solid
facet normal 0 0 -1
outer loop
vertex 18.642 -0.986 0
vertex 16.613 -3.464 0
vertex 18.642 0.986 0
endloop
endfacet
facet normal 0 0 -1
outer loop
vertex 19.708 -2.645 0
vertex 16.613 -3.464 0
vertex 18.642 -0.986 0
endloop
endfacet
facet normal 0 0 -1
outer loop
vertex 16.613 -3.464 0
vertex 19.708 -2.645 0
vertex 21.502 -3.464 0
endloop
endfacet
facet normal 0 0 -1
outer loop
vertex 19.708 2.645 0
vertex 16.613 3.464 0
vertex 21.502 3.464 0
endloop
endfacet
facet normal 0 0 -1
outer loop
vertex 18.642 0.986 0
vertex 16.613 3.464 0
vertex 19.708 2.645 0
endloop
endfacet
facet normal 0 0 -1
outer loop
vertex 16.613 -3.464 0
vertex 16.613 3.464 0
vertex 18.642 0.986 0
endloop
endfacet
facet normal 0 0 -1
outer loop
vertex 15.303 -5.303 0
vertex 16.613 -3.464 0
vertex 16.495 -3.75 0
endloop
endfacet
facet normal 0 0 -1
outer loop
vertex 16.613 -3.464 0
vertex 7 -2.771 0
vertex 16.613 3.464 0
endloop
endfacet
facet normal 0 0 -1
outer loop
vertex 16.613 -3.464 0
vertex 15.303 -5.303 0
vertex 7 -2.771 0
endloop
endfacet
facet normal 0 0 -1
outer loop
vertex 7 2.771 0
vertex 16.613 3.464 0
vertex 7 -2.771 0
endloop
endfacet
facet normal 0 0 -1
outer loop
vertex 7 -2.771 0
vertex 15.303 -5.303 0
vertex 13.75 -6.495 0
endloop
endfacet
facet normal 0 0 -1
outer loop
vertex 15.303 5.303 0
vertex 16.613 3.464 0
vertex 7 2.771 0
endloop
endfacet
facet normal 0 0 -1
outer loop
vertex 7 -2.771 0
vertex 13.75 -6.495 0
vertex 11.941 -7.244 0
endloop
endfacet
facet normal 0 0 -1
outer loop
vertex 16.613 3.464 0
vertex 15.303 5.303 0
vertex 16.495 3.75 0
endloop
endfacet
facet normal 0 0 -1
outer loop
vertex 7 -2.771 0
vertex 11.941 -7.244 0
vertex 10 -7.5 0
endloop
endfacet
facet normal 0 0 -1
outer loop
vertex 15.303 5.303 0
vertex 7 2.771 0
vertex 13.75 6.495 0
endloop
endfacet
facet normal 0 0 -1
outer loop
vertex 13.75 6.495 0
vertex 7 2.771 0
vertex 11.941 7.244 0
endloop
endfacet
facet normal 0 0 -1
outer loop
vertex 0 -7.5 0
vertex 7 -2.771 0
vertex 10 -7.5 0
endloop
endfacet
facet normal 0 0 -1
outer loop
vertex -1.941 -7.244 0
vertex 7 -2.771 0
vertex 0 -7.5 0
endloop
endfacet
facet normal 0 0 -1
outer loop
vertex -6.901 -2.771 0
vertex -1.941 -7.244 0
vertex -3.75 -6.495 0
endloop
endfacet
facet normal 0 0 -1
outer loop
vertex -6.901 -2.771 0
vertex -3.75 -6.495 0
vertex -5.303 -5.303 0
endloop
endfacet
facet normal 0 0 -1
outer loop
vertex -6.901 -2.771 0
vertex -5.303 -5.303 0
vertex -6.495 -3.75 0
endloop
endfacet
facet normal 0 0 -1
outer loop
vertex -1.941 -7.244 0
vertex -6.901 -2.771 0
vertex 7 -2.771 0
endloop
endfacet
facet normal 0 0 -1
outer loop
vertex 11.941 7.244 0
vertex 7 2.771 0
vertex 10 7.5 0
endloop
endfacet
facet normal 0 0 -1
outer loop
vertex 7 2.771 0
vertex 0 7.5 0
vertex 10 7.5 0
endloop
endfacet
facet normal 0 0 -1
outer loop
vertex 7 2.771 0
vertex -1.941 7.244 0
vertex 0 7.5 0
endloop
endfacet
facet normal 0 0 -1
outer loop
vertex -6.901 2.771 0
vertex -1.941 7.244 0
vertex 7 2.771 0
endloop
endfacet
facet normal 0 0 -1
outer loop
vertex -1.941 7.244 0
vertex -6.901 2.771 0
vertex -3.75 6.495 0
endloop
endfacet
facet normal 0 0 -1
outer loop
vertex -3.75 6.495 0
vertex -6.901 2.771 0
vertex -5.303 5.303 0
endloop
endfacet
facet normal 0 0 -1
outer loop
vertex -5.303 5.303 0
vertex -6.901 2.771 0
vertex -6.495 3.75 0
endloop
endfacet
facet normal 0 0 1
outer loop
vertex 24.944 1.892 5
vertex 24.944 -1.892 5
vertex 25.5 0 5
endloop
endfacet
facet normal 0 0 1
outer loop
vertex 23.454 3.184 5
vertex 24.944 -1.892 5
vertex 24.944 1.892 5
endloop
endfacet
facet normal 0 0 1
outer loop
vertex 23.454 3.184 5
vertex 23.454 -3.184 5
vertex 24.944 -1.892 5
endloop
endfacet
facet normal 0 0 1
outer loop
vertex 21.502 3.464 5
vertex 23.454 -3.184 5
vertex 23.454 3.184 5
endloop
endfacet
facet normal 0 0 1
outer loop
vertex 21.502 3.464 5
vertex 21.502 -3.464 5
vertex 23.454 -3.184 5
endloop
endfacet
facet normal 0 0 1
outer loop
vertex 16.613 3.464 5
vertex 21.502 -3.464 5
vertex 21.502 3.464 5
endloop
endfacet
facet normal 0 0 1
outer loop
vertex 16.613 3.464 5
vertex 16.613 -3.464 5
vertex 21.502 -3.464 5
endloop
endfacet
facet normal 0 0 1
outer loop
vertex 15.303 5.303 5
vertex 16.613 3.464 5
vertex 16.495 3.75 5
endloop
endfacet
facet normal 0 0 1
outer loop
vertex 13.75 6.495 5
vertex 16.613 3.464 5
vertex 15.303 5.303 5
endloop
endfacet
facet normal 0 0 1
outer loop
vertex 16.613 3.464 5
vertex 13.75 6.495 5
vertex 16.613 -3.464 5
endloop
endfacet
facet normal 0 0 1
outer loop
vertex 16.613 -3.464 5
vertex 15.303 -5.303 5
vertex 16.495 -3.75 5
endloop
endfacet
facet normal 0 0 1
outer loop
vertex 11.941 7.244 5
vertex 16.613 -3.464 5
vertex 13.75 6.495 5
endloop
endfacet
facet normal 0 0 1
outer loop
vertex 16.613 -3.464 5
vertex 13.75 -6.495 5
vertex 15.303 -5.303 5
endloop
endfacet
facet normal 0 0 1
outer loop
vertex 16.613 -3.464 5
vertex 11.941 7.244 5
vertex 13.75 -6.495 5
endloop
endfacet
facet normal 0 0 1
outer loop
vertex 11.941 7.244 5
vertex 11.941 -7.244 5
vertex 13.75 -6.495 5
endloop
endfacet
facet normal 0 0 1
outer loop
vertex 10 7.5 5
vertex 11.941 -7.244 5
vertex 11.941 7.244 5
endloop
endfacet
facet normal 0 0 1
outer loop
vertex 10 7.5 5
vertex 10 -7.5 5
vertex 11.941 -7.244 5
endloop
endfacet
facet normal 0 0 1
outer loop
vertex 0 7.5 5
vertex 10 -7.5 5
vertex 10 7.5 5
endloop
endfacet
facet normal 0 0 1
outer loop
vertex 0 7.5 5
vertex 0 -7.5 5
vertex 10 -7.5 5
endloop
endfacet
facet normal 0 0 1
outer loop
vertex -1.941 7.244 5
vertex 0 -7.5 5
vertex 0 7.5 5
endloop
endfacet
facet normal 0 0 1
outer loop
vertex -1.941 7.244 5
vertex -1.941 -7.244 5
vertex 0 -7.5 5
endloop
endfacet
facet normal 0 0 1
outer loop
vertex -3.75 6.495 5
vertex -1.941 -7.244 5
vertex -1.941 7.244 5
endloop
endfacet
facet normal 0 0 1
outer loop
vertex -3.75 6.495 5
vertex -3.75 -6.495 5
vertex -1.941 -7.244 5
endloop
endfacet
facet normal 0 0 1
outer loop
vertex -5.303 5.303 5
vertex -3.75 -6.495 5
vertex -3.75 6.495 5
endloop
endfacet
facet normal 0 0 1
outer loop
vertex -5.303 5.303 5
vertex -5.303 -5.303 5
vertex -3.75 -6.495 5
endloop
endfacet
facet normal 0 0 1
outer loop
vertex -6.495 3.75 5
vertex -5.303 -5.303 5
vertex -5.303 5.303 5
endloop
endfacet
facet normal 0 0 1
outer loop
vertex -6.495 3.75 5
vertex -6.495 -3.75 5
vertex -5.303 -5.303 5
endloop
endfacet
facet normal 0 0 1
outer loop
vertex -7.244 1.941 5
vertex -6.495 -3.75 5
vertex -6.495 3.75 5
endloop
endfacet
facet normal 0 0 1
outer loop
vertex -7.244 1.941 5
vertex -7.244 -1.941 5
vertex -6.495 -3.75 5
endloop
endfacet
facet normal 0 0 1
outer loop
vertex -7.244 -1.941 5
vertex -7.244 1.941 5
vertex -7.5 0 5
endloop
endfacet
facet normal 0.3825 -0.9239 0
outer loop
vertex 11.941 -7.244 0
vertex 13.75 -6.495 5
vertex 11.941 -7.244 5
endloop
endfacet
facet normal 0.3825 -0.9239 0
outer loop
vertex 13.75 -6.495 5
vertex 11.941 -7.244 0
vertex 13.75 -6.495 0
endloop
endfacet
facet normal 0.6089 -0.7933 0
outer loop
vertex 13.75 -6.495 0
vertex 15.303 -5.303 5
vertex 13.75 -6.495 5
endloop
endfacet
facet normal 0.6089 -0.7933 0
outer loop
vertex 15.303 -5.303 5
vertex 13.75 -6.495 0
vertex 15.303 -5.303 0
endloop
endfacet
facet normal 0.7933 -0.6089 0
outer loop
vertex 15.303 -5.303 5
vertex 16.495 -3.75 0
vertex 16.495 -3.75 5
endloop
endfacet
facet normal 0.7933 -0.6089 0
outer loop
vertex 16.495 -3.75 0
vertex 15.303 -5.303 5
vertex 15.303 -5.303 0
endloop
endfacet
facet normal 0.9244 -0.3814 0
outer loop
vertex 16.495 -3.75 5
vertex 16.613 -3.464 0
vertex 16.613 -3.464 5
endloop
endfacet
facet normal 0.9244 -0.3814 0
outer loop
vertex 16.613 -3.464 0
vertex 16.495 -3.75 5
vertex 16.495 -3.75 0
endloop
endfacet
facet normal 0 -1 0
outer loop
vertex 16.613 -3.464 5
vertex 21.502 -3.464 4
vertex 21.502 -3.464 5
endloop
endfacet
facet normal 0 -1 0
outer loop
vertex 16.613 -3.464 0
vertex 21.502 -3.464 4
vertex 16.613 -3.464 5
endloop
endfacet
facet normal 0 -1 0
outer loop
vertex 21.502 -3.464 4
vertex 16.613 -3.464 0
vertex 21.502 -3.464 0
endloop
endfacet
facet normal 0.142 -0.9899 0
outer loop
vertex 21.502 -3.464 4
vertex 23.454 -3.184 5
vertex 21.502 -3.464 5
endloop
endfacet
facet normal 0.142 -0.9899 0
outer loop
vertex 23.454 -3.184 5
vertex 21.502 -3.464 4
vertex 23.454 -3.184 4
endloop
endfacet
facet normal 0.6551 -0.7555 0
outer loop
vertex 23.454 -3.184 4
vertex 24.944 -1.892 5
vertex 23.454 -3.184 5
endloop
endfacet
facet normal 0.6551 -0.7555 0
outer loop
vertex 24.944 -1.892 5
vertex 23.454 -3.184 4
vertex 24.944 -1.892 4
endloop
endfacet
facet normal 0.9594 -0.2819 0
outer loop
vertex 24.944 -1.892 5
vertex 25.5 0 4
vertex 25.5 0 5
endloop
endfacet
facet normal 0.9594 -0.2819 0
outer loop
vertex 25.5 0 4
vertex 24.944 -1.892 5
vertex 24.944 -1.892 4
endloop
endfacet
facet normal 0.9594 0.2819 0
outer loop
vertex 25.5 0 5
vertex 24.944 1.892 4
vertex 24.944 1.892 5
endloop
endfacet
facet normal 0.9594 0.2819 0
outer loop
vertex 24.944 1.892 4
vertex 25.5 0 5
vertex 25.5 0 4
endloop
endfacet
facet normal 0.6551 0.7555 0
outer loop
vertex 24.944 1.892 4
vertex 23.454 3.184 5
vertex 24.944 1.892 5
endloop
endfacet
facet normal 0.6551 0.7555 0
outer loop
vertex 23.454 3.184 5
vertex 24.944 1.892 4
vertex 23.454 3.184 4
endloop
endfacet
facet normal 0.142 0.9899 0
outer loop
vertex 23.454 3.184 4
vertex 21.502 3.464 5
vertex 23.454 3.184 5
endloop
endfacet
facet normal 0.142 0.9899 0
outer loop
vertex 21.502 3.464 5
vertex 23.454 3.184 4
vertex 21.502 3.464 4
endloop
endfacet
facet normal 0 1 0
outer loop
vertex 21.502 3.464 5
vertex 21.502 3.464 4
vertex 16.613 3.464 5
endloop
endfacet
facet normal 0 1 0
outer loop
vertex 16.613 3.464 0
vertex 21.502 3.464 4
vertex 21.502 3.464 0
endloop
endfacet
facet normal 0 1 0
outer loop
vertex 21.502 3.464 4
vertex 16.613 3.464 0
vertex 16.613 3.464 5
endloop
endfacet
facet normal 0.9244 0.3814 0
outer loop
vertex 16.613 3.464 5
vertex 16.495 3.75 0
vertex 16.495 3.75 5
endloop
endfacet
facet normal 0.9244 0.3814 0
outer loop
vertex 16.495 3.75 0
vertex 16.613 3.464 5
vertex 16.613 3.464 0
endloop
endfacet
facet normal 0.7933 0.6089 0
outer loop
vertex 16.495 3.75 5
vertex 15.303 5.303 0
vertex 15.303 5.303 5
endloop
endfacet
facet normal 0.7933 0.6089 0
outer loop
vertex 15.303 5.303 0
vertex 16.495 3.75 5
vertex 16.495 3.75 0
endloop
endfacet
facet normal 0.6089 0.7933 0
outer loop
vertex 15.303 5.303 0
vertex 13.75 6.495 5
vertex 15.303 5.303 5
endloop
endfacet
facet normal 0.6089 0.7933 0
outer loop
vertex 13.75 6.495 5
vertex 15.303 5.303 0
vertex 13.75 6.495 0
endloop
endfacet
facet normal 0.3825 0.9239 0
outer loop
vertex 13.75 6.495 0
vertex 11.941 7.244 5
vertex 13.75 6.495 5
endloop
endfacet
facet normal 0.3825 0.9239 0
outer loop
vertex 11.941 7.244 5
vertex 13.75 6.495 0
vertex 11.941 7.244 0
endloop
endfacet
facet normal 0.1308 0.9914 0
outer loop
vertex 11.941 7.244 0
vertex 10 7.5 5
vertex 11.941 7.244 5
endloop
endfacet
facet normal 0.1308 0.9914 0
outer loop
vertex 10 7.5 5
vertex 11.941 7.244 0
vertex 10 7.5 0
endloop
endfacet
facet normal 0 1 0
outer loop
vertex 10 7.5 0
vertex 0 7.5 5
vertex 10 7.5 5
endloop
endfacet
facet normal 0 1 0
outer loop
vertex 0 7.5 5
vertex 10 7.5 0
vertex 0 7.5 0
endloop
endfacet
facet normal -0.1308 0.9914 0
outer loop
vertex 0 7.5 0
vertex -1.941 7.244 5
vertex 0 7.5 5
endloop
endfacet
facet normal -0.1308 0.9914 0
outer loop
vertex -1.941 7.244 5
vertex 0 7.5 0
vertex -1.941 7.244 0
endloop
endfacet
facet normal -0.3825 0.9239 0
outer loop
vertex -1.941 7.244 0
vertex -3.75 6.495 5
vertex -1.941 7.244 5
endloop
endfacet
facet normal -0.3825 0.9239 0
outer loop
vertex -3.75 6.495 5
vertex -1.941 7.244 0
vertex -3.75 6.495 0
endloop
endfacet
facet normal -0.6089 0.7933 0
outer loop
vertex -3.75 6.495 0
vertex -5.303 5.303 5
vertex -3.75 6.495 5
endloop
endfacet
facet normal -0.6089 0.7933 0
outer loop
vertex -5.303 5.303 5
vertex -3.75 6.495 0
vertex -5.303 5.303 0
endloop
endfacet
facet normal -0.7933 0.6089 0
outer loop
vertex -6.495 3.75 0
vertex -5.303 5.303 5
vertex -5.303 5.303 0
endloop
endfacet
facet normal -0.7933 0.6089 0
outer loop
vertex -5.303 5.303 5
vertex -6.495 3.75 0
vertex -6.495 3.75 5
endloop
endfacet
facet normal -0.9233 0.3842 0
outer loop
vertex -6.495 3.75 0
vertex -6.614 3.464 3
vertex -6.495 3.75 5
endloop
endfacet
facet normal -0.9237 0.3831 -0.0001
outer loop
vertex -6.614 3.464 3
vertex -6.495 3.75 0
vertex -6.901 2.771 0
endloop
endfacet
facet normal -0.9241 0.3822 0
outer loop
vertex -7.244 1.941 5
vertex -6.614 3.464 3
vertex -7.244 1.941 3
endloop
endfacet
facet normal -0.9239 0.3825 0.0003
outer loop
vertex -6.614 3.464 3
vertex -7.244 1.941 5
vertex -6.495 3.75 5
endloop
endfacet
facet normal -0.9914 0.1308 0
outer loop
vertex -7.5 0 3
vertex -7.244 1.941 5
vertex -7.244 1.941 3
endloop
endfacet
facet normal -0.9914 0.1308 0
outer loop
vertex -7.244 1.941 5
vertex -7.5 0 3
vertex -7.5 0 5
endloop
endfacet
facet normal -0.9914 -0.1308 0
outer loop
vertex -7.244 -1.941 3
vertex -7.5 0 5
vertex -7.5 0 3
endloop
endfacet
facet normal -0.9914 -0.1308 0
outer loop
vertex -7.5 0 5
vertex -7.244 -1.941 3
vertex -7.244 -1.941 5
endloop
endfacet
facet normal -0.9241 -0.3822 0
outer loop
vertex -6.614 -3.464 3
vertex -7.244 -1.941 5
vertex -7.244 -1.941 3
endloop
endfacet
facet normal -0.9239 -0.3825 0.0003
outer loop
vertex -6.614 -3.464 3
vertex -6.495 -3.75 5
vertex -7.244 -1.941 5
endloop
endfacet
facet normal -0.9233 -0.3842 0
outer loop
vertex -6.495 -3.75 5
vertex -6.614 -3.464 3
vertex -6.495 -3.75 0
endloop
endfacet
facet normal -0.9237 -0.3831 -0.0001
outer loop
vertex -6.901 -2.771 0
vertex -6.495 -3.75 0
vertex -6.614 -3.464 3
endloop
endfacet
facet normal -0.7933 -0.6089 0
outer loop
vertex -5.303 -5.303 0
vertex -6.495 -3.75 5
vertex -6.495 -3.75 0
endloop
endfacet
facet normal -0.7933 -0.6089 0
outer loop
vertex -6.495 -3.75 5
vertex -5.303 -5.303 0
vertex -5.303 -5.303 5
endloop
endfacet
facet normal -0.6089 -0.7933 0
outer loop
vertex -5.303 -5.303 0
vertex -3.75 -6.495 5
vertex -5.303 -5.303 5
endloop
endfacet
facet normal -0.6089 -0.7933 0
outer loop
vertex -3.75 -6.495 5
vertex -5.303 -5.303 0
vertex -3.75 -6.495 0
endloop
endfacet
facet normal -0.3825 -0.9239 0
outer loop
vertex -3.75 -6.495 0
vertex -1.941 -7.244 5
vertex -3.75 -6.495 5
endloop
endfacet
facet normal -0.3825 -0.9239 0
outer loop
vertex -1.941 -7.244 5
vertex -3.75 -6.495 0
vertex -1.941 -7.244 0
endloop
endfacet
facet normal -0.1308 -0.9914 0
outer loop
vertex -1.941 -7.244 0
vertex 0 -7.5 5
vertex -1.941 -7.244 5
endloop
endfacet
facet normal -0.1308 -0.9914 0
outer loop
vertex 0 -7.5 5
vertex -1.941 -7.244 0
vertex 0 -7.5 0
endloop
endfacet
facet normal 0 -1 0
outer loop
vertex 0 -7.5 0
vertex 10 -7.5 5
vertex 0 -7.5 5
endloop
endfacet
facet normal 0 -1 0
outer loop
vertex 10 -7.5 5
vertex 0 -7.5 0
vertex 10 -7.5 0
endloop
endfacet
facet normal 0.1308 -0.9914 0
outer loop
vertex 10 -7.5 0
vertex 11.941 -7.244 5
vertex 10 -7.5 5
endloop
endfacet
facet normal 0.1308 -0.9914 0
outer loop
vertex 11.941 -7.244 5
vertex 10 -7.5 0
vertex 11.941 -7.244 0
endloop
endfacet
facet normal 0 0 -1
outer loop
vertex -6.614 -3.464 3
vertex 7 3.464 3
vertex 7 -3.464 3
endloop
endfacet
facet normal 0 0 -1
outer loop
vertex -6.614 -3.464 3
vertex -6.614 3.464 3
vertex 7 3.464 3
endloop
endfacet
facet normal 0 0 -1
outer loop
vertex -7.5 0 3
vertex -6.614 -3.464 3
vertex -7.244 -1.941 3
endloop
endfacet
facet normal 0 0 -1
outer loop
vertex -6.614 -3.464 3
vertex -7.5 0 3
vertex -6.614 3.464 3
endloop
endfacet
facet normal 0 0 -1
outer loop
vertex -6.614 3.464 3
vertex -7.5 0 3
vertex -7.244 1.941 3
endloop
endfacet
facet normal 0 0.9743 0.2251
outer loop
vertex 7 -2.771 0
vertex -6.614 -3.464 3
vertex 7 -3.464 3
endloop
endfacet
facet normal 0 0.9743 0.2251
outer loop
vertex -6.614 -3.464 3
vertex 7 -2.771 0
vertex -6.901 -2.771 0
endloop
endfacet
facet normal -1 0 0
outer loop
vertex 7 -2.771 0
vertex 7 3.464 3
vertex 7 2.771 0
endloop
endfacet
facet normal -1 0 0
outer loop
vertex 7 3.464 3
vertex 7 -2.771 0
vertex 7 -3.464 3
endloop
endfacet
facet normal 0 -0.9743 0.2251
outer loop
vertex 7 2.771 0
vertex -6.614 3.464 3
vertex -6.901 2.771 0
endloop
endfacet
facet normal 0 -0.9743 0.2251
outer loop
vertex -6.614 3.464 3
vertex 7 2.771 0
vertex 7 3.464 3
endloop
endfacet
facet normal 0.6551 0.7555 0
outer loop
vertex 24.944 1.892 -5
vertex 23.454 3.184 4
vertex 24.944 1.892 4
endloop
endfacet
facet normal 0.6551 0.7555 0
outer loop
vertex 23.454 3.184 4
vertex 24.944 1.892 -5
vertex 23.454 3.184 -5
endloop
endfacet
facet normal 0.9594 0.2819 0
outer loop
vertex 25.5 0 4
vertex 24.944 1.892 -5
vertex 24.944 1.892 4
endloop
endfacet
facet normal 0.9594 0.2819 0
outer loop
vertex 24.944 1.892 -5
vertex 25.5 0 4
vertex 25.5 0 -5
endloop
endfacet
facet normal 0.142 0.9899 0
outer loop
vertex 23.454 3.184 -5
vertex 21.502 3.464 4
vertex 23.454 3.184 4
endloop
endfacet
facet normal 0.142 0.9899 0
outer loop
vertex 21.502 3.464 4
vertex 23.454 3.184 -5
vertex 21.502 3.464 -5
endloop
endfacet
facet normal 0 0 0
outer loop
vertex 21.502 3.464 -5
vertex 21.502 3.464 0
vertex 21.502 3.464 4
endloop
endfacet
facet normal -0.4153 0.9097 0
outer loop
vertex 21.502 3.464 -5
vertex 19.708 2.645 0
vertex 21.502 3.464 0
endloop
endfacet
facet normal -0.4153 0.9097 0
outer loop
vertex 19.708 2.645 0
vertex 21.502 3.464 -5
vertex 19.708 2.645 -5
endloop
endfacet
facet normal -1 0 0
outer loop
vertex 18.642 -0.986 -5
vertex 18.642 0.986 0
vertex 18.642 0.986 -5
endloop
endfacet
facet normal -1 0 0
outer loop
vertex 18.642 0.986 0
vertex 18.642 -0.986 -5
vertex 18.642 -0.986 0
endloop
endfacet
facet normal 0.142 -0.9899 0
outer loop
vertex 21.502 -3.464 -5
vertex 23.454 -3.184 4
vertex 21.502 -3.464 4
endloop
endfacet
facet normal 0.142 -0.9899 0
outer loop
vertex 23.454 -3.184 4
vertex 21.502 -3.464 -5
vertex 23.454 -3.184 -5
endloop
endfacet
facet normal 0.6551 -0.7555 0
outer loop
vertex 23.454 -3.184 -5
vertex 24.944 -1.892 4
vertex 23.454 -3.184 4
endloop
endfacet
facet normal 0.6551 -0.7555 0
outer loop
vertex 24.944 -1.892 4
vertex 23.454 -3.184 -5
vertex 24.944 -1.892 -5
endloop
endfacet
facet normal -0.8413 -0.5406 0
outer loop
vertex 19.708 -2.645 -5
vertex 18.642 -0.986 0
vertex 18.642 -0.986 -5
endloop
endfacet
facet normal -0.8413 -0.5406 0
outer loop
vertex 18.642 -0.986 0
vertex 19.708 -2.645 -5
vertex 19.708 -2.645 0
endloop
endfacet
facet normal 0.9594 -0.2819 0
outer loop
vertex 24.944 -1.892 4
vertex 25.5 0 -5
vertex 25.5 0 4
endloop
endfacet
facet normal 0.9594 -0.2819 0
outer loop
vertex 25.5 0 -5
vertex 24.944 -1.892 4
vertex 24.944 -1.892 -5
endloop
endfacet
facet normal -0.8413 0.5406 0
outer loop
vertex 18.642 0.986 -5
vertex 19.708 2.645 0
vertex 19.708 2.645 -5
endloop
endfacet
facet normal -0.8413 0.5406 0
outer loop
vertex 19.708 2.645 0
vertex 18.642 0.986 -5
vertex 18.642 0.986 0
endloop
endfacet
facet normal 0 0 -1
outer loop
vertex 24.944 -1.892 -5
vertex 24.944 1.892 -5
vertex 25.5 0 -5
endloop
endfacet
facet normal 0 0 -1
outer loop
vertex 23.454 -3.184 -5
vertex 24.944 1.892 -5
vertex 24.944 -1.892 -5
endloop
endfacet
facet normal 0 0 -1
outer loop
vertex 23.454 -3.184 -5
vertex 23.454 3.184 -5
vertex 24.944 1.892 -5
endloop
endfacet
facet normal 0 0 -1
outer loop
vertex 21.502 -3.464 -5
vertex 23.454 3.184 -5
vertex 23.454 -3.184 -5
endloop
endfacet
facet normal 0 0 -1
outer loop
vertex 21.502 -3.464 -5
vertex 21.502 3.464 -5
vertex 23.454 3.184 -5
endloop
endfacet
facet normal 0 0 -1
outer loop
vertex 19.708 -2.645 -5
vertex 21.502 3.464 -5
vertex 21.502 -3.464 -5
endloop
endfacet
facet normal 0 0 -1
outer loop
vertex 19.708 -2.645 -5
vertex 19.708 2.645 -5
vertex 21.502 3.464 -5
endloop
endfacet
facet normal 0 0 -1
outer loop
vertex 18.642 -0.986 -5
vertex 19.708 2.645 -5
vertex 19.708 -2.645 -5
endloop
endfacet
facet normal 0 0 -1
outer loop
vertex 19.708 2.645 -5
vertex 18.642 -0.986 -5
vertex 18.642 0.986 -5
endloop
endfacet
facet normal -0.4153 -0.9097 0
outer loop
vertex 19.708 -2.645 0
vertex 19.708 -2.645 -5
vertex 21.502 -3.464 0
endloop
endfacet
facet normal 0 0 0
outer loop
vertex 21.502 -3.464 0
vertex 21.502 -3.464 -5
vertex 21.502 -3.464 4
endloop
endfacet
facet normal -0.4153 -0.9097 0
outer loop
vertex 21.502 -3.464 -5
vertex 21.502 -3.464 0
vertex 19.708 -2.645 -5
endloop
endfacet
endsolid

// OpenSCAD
module oval(d, length) {
hull() {
  circle(d=d);
  translate([length,0,0]) circle(d=d);
  }
};

body_d = 15;
arm_d = 7;
screw_d = 5;
screw_head_d=7;
screw_h=2;

difference() {
  linear_extrude(height=5) {
    oval(body_d, length=10);
    translate([12,0,0]) oval(arm_d, length=10);
  }
  translate([-8,0,-2])
  scale([1,1,2.5])
  rotate([0,90,0])
  linear_extrude(height=15) {
    circle(d=8, $fn=3);
    }
}

translate([22,0,-5]) cylinder(d=arm_d, h=9);
